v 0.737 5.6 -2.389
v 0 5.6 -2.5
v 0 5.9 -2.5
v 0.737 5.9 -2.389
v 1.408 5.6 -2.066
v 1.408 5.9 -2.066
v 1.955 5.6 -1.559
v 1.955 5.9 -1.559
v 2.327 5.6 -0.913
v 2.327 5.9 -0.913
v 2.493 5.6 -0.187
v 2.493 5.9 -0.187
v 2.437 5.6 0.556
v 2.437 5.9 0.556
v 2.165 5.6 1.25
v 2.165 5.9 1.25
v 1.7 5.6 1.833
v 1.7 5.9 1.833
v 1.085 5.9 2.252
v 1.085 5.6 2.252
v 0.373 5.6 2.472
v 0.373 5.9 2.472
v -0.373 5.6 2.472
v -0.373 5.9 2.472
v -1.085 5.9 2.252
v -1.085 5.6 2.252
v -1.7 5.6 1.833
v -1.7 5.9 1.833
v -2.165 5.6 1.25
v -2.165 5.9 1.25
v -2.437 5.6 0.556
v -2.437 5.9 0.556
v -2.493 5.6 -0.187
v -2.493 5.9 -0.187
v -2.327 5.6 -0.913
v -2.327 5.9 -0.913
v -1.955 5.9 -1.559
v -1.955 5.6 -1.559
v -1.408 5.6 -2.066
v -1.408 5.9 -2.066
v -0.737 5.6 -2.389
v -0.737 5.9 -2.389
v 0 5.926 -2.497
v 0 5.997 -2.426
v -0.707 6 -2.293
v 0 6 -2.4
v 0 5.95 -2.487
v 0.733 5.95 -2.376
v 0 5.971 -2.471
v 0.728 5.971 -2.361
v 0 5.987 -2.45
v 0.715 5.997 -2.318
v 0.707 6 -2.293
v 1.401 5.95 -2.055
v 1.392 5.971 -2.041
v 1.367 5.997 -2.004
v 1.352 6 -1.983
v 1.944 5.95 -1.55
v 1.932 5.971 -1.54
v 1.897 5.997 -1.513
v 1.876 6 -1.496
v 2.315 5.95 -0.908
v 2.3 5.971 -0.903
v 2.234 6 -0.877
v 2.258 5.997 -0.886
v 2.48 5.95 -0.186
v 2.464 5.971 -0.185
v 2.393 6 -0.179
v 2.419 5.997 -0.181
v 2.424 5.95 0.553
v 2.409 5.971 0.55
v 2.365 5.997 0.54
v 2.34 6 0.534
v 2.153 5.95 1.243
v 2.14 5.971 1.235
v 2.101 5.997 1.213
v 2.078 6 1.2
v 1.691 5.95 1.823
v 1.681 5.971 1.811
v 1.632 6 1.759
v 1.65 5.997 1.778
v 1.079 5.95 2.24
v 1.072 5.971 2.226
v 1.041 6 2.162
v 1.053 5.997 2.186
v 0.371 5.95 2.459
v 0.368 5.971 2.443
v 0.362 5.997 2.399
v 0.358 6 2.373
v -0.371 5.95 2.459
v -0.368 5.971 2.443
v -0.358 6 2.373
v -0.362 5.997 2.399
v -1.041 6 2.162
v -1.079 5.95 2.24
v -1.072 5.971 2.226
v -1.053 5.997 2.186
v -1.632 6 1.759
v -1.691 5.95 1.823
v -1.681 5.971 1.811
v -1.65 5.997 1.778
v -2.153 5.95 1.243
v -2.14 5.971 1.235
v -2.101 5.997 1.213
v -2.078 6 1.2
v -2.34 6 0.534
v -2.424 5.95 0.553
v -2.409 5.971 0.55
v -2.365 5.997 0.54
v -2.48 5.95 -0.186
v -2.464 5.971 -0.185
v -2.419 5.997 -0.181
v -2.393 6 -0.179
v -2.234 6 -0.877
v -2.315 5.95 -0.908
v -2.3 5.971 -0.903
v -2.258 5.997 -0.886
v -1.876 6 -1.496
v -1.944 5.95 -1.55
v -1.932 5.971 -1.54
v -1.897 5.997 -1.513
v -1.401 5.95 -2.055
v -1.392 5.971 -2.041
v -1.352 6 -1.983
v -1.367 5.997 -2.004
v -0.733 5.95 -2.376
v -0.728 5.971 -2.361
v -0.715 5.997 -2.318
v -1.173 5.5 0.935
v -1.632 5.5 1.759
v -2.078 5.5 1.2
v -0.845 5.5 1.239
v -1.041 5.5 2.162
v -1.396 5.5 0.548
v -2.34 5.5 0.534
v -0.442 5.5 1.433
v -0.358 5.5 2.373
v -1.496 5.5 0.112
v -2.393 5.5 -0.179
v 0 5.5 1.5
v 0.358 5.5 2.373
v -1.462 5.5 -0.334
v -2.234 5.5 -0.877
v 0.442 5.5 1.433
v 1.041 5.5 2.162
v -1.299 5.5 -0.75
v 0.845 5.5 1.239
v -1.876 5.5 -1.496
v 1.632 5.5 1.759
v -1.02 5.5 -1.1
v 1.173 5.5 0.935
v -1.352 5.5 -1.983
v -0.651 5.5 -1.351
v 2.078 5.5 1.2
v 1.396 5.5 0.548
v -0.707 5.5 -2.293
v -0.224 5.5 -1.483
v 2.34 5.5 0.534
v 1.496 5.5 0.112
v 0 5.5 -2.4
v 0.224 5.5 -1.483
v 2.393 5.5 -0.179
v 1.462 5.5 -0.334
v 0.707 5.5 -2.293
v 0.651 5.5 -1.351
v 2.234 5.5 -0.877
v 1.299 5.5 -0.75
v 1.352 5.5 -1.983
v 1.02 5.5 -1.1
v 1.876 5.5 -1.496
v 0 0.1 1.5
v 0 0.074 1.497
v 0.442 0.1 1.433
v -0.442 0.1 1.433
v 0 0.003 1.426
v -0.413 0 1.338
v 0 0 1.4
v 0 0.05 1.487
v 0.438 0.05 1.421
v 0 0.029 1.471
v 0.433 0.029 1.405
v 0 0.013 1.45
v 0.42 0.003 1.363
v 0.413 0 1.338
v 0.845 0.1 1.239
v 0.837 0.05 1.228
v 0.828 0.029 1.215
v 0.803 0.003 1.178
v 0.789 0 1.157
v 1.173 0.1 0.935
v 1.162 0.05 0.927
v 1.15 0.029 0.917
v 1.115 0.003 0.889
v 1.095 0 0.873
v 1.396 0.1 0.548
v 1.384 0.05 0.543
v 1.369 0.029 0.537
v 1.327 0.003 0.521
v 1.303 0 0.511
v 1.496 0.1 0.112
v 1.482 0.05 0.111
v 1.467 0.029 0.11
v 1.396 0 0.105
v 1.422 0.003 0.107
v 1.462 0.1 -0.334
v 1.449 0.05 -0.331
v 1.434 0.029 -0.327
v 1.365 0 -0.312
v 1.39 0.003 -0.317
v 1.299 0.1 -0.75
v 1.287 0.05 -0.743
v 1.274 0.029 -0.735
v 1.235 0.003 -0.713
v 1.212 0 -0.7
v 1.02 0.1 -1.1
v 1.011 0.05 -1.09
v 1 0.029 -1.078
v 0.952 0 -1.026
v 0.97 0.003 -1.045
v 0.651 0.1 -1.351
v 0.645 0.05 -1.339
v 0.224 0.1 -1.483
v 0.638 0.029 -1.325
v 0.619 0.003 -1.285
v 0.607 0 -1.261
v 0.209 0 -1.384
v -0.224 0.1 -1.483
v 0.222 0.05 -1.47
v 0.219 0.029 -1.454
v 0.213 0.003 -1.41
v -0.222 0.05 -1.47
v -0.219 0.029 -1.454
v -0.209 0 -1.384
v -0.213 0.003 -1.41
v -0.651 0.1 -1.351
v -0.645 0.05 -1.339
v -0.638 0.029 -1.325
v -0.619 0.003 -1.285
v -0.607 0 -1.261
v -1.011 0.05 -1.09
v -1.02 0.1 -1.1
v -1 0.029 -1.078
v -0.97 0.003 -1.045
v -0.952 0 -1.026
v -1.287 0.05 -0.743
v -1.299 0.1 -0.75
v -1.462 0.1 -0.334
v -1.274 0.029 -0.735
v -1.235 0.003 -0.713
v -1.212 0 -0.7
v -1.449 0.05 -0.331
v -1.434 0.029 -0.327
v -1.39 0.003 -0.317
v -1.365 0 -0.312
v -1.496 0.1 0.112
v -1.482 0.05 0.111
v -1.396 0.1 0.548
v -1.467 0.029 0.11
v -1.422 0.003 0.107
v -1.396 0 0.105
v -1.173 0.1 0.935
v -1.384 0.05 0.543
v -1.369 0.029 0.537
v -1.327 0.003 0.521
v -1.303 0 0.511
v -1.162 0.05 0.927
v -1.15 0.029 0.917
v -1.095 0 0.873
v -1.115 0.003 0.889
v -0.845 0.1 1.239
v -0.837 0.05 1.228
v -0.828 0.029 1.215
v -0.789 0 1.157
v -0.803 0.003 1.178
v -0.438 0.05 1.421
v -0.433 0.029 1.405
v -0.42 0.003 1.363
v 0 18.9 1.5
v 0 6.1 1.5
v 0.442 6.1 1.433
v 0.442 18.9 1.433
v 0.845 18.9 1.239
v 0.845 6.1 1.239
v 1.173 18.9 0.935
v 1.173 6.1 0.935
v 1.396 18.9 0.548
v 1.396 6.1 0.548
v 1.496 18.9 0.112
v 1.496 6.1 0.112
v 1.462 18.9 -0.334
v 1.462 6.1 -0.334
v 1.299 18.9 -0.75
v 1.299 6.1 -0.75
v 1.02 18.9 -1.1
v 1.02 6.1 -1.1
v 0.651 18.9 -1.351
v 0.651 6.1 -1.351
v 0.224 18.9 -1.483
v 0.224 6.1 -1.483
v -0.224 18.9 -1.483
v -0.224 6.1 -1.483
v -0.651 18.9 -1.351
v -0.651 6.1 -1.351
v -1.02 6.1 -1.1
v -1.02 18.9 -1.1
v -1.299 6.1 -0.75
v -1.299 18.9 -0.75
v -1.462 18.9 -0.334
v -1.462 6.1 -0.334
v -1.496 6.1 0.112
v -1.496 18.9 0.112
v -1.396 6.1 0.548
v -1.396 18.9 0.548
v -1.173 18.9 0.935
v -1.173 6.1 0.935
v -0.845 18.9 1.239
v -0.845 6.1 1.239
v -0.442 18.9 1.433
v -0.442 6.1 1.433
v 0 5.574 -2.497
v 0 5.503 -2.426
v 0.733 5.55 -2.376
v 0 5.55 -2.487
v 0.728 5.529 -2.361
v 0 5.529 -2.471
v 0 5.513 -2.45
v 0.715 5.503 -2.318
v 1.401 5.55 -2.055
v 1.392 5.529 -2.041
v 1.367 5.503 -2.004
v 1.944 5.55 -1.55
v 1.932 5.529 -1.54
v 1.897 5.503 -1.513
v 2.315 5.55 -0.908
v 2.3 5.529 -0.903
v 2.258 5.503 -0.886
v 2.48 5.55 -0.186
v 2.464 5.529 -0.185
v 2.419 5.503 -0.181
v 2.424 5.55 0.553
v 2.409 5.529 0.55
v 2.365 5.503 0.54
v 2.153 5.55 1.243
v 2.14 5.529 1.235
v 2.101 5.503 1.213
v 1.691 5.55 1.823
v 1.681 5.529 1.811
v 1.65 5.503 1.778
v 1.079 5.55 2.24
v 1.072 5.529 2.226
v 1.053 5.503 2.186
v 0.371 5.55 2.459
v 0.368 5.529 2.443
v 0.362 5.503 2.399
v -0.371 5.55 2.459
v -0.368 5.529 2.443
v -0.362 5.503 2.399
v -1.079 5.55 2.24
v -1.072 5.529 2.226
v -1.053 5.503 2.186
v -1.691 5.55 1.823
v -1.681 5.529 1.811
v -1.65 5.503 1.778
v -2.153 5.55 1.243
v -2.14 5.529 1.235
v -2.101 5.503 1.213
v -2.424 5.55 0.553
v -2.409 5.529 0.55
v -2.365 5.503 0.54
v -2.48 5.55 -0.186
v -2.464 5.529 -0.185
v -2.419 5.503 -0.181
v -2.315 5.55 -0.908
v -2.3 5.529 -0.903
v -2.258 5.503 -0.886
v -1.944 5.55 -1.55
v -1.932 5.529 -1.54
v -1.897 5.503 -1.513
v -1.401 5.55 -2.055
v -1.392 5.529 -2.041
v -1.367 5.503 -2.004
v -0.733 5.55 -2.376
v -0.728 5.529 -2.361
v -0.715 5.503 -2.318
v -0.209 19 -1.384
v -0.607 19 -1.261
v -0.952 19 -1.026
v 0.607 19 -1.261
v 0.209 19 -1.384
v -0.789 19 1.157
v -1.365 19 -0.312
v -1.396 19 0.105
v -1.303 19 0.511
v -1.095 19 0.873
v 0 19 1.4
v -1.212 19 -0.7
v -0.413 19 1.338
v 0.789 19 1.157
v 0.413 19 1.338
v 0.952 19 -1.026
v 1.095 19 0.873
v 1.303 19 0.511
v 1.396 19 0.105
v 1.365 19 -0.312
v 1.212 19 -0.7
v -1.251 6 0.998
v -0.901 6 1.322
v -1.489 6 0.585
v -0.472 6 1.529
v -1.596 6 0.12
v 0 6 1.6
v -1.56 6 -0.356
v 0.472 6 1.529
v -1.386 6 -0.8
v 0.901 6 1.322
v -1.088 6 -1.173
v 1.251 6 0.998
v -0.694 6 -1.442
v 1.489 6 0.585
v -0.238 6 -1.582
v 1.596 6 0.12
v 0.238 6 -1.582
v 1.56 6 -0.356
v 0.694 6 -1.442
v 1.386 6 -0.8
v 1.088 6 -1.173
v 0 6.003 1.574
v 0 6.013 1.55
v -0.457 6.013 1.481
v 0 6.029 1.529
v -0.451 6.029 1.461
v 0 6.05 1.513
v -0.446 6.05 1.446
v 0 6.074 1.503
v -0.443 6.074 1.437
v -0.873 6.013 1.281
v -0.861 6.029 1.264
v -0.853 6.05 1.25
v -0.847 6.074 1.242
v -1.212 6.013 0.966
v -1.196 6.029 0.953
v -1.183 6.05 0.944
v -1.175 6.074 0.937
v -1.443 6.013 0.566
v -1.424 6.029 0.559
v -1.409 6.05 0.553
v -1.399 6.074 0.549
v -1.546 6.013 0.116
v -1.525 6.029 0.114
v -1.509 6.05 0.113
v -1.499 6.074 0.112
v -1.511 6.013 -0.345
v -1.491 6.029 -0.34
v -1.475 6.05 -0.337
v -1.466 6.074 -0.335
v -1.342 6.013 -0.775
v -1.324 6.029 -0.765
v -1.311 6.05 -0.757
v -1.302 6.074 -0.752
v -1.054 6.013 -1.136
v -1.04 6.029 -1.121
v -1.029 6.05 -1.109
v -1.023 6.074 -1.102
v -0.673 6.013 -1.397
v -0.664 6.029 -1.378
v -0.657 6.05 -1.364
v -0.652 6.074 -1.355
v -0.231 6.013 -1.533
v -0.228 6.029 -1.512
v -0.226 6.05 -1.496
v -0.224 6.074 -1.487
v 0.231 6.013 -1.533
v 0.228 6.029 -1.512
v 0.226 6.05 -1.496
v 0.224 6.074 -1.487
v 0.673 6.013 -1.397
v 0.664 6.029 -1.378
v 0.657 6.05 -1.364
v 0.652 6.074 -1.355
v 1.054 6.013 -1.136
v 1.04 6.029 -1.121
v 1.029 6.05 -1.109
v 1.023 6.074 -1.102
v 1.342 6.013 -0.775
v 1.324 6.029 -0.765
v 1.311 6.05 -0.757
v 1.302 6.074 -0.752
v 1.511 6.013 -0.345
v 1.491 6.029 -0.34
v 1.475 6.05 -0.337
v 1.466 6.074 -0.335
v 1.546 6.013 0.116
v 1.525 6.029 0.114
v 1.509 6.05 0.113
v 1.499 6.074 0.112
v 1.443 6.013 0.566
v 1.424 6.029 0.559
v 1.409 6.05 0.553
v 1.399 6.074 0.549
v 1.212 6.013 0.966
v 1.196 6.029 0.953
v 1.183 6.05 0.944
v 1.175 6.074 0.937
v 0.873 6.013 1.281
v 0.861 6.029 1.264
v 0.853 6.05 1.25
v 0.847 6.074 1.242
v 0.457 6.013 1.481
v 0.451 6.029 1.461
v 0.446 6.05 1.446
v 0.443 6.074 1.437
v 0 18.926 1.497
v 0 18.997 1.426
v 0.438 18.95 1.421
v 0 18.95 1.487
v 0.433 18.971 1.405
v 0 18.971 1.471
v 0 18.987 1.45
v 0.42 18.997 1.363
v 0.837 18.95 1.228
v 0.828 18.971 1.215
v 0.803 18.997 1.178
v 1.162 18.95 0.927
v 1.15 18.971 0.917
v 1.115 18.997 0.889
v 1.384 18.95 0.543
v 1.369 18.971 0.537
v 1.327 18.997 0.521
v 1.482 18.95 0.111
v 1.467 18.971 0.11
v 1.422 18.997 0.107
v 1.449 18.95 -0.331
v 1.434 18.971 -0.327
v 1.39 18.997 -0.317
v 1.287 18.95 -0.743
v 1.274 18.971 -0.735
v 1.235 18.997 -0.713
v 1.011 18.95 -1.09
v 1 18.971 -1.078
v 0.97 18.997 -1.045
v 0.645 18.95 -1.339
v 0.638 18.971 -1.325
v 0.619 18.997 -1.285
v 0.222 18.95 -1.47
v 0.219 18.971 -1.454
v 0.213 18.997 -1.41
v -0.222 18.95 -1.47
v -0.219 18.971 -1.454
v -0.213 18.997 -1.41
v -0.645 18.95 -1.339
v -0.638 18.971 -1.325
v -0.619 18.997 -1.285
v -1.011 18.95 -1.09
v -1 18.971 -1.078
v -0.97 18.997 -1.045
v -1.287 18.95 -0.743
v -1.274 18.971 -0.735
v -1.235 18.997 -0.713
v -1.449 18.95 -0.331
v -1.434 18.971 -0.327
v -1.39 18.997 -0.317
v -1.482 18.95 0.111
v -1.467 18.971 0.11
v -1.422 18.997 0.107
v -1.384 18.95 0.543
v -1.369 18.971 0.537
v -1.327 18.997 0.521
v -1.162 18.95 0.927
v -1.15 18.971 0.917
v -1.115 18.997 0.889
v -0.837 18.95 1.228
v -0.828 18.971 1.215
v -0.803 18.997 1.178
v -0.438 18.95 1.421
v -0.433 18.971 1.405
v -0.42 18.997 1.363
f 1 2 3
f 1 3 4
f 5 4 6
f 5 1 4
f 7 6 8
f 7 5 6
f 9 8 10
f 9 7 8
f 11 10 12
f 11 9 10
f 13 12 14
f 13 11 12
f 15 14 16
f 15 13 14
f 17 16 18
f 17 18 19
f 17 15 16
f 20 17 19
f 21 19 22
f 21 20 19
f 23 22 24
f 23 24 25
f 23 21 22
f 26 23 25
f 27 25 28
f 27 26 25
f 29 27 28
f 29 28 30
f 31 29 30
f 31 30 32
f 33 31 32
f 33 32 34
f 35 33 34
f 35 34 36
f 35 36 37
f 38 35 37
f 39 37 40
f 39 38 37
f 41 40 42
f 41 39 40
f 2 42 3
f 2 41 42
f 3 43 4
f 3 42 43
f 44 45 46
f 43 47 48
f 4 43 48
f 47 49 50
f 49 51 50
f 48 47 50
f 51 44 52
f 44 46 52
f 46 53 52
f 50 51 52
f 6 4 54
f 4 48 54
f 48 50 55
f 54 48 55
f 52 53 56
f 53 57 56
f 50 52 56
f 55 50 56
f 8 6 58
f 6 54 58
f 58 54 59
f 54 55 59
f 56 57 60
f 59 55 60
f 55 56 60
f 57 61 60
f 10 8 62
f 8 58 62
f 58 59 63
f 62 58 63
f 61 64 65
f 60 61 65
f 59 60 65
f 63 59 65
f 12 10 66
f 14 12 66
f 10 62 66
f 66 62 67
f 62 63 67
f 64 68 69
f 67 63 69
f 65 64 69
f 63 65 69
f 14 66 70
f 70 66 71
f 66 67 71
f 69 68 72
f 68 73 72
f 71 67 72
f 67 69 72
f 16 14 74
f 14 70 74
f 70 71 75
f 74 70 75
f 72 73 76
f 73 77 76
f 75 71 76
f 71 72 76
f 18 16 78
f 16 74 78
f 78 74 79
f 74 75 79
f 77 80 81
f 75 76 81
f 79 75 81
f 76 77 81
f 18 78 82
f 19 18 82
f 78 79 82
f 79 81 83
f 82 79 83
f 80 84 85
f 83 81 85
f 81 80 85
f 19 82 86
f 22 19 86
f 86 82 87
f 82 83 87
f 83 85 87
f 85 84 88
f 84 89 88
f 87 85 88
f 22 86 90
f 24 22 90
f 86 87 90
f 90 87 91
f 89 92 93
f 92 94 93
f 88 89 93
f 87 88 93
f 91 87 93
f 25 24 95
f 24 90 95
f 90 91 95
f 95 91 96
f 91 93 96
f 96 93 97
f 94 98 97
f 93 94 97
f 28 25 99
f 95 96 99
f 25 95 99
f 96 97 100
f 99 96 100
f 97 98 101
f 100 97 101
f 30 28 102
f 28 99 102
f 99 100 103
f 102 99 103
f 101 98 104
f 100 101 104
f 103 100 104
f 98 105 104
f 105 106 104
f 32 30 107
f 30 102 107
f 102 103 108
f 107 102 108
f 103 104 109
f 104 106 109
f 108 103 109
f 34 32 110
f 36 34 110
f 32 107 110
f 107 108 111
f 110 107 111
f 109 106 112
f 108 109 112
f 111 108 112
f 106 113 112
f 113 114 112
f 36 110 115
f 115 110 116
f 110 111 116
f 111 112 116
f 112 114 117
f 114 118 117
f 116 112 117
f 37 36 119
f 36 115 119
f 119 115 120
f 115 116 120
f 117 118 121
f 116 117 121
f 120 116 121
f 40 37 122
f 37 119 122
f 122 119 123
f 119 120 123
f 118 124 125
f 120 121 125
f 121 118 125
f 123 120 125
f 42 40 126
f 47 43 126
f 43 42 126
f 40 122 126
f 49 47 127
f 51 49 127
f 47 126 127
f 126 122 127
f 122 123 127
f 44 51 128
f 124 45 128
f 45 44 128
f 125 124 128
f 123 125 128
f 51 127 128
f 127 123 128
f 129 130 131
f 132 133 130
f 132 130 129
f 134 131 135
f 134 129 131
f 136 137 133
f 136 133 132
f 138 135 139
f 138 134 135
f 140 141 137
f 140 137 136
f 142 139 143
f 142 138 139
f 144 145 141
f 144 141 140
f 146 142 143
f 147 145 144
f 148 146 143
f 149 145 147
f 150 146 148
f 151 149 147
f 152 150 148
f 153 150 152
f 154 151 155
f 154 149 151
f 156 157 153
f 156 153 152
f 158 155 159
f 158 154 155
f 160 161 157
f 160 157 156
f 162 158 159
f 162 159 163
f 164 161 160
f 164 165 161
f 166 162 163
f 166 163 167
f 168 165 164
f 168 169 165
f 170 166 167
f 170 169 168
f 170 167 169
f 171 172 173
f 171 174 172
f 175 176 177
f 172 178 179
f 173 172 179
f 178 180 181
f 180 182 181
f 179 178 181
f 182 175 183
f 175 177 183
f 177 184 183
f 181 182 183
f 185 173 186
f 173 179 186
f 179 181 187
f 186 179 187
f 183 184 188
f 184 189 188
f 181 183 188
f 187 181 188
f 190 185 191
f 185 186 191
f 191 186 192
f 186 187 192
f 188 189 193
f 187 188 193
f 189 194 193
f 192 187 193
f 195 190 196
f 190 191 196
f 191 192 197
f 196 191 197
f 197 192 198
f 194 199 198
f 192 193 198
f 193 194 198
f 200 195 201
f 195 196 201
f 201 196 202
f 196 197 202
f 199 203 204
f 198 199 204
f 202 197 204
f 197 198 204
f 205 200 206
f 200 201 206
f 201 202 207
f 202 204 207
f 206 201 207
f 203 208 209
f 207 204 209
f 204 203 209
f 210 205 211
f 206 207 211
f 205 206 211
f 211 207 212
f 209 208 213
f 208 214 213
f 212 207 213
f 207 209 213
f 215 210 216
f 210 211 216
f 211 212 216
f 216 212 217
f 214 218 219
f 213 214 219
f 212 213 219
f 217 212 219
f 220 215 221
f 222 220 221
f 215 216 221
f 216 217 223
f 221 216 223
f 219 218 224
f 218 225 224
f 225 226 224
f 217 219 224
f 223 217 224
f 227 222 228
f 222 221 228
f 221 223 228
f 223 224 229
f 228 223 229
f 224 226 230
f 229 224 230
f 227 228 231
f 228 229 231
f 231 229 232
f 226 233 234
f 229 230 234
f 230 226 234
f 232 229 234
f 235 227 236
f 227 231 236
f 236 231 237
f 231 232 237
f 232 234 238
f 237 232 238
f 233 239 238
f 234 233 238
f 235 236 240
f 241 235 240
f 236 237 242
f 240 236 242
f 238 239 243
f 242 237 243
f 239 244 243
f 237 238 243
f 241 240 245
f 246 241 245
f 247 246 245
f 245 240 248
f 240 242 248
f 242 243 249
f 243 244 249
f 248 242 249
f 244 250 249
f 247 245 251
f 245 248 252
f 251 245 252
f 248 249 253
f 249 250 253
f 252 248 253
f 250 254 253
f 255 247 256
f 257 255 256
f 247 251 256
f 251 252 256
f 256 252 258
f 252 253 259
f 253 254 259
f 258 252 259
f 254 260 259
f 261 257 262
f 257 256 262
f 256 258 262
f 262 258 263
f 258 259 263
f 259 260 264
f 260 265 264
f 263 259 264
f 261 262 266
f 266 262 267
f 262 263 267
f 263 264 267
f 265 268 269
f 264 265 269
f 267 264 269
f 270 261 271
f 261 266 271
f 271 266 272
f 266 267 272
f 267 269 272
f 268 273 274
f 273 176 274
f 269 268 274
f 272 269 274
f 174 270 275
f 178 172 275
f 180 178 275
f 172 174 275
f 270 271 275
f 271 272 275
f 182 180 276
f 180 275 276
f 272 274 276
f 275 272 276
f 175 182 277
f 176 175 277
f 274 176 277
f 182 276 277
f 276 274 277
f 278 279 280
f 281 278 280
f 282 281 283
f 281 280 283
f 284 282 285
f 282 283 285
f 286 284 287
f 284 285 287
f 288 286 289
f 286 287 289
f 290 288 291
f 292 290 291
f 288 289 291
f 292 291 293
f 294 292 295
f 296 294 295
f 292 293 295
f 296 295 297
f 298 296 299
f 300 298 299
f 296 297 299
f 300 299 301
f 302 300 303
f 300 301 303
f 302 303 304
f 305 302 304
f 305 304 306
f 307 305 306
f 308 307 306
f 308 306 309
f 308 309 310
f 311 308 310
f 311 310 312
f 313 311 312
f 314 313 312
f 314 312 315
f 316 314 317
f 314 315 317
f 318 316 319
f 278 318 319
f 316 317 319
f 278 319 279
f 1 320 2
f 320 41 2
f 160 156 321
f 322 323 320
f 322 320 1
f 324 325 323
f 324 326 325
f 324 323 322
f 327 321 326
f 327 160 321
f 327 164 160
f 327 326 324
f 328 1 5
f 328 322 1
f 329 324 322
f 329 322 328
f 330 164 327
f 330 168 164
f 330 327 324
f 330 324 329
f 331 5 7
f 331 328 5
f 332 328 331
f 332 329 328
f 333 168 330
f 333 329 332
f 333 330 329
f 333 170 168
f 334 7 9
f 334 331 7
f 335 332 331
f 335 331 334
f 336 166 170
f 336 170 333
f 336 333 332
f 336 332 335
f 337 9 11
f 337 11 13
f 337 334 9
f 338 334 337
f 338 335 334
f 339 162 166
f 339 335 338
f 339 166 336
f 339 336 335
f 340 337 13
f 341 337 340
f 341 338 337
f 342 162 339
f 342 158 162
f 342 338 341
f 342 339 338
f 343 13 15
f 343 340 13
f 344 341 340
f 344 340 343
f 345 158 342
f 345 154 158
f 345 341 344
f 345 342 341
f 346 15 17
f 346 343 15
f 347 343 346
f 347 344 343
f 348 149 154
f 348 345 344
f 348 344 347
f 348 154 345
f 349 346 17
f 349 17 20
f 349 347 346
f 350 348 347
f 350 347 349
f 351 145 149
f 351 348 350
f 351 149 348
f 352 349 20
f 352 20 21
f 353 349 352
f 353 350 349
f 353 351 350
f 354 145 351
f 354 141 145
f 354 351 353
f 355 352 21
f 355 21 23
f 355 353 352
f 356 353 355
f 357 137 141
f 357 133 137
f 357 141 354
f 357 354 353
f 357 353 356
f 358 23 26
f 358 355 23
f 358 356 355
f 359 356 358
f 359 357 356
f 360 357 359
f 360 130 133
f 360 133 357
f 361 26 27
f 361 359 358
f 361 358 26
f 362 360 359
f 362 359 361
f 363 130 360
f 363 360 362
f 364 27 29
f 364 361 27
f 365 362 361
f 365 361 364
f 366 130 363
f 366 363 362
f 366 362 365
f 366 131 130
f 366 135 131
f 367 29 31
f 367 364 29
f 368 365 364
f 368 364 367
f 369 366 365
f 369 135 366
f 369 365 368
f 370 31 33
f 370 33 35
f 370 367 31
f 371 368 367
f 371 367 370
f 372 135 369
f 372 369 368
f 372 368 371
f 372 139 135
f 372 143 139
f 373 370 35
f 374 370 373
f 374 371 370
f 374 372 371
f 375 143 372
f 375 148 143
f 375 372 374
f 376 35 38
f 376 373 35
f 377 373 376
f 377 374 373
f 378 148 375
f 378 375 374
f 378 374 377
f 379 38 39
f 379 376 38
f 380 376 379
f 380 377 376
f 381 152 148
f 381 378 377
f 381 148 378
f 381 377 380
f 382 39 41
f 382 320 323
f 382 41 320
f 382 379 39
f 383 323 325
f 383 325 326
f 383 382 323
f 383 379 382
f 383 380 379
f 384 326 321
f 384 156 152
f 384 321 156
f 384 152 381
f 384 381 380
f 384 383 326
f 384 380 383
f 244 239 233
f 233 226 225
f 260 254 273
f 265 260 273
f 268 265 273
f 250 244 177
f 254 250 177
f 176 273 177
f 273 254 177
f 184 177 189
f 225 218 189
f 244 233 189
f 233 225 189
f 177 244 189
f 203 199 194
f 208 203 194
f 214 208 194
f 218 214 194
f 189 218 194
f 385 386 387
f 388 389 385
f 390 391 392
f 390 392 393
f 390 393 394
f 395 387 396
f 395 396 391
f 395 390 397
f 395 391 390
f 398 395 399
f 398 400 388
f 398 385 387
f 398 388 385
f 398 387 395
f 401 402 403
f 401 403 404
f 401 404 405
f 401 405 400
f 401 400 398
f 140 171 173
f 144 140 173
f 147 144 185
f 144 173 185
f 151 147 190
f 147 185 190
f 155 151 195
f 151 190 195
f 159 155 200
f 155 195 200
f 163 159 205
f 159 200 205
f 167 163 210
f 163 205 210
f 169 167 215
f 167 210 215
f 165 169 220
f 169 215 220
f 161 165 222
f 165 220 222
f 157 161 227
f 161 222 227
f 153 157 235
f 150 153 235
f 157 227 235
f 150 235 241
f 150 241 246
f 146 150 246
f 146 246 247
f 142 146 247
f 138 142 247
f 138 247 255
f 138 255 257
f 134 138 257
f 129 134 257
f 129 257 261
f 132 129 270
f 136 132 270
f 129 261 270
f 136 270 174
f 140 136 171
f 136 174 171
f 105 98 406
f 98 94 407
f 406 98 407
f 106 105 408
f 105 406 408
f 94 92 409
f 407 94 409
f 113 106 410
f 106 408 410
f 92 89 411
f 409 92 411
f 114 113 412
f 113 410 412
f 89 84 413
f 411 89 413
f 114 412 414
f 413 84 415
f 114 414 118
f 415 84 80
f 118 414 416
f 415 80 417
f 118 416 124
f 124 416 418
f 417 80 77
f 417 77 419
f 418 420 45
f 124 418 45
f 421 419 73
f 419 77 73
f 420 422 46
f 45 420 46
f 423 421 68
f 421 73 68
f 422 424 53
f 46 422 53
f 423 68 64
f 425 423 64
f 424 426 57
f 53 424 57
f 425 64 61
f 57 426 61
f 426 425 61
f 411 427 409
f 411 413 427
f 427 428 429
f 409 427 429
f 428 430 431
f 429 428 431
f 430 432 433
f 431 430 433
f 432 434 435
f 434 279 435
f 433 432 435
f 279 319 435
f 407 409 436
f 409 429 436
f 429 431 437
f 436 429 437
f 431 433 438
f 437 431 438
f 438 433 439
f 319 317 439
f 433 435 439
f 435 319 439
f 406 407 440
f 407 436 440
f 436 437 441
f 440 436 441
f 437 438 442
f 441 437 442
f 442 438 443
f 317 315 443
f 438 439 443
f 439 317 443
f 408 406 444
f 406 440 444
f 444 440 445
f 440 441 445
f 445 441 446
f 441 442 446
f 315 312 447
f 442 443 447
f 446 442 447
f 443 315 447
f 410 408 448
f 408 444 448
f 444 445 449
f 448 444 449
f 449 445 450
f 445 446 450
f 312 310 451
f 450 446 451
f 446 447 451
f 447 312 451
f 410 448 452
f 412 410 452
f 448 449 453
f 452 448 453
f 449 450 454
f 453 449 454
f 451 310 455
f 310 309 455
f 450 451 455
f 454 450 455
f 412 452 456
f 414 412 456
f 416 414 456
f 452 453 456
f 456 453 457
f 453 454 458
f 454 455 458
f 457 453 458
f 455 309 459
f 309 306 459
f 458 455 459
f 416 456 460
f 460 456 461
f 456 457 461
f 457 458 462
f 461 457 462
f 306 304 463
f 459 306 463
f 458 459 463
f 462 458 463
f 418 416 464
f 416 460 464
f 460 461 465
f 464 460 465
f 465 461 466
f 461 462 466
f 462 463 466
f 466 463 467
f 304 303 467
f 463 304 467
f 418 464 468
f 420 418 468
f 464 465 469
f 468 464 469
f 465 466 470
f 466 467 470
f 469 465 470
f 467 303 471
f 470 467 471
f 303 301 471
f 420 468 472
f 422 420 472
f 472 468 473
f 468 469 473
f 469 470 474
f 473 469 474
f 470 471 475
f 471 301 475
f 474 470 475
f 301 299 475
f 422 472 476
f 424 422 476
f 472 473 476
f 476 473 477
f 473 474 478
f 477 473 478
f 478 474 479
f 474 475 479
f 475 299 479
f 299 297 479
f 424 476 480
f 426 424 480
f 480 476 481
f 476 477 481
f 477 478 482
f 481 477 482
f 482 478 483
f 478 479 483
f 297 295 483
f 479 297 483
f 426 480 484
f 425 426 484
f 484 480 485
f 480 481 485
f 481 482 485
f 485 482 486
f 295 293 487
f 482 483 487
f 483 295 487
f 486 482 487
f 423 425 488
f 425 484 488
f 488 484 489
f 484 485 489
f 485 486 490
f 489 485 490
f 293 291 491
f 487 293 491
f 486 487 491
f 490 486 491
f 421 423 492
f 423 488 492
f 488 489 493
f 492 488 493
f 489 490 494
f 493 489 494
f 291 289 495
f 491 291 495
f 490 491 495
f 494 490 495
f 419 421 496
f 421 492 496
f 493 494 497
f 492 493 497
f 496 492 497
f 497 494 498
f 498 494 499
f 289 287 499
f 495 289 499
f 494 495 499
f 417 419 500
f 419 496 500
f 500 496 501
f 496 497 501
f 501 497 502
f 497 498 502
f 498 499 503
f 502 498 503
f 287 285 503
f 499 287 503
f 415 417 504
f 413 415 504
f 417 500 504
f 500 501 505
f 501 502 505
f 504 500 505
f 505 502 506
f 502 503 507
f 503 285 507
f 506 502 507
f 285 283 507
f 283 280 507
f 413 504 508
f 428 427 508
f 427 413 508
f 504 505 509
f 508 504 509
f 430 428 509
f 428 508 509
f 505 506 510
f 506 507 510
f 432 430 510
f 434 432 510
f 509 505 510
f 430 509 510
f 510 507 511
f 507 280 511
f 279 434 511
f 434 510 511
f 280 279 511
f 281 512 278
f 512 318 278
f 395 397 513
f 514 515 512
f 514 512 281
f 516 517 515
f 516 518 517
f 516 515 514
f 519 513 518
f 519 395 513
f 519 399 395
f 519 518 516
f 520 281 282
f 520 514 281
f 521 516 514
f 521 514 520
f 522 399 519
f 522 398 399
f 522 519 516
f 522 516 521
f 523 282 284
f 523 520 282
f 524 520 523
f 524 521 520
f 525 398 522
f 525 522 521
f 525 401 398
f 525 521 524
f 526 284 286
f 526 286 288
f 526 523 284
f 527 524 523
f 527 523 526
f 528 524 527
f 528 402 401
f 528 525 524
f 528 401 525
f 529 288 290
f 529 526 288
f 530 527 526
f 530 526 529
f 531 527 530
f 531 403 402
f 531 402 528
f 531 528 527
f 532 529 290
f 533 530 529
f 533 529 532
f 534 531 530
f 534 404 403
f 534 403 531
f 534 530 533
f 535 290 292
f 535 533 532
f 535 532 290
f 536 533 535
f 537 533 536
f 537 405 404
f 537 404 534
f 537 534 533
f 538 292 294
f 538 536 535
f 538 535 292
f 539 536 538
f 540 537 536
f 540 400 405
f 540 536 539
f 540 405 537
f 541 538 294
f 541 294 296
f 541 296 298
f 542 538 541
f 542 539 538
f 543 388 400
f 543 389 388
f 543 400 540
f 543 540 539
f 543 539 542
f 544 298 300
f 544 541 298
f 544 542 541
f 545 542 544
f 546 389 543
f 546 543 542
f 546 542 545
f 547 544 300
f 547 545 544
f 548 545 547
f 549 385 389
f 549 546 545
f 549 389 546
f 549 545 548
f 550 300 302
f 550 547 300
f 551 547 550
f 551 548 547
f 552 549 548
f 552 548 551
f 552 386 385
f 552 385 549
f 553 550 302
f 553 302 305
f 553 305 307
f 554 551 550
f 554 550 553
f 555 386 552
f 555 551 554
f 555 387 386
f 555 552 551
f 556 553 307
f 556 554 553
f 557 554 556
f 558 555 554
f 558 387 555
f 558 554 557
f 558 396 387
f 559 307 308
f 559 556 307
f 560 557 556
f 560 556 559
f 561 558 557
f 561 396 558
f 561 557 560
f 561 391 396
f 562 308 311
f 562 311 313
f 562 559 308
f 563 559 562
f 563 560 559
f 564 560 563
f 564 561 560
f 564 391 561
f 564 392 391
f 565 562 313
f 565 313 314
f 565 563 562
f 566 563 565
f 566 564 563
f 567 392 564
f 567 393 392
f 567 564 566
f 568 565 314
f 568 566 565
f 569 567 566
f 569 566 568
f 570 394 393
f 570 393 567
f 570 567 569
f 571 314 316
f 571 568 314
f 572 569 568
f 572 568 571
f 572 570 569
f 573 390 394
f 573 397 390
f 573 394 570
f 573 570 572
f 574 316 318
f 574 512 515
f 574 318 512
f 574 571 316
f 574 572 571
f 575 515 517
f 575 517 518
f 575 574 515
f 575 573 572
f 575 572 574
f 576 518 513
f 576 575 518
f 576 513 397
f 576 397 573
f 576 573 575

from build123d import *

# Parameters (mm, degrees)
SKETCH_1_R      = 1.5
EXTRUDE_1_DEPTH = 19
EXTRUDE_START   = -5.5
SKETCH_3_R      = 2.5
SKETCH_3_R_2    = 1.5
EXTRUDE_3_DEPTH = 0.5
FILLET_1_R      = 0.1


with BuildPart() as part:
    # 草图1 → 凸台-拉伸1 (new body)
    with BuildSketch(Plane(origin=(0, 0, 0), x_dir=(1, 0, 0), z_dir=(0, 1, 0))):
        with Locations(Location((0, 0, 0), (0, 0, 270))):
            Circle(SKETCH_1_R)
    extrude(amount=EXTRUDE_1_DEPTH)

    # 草图3 → 凸台-拉伸3 (add)
    with BuildSketch(Plane(origin=(0, 0, 0), x_dir=(-1, 0, 0), z_dir=(0, -1, 0)).offset(EXTRUDE_START)):
        with Locations(Location((0, 0, 0), (0, 0, 90))):
            Circle(SKETCH_3_R)
        with Locations(Location((0, 0, 0), (0, 0, 90))):
            Circle(SKETCH_3_R_2, mode=Mode.SUBTRACT)
    extrude(amount=-EXTRUDE_3_DEPTH)

    # 圆角1
    fillet_1_edges = [part.edges().sort_by_distance(p)[0] for p in [
        (0, 0, -1.5),
        (0, 19, -1.5),
        (0, 6, -1.5),
        (0, 5.5, 2.5),
        (0, 6, 2.5),
    ]]
    fillet(fillet_1_edges, radius=FILLET_1_R)


solid = part.part
